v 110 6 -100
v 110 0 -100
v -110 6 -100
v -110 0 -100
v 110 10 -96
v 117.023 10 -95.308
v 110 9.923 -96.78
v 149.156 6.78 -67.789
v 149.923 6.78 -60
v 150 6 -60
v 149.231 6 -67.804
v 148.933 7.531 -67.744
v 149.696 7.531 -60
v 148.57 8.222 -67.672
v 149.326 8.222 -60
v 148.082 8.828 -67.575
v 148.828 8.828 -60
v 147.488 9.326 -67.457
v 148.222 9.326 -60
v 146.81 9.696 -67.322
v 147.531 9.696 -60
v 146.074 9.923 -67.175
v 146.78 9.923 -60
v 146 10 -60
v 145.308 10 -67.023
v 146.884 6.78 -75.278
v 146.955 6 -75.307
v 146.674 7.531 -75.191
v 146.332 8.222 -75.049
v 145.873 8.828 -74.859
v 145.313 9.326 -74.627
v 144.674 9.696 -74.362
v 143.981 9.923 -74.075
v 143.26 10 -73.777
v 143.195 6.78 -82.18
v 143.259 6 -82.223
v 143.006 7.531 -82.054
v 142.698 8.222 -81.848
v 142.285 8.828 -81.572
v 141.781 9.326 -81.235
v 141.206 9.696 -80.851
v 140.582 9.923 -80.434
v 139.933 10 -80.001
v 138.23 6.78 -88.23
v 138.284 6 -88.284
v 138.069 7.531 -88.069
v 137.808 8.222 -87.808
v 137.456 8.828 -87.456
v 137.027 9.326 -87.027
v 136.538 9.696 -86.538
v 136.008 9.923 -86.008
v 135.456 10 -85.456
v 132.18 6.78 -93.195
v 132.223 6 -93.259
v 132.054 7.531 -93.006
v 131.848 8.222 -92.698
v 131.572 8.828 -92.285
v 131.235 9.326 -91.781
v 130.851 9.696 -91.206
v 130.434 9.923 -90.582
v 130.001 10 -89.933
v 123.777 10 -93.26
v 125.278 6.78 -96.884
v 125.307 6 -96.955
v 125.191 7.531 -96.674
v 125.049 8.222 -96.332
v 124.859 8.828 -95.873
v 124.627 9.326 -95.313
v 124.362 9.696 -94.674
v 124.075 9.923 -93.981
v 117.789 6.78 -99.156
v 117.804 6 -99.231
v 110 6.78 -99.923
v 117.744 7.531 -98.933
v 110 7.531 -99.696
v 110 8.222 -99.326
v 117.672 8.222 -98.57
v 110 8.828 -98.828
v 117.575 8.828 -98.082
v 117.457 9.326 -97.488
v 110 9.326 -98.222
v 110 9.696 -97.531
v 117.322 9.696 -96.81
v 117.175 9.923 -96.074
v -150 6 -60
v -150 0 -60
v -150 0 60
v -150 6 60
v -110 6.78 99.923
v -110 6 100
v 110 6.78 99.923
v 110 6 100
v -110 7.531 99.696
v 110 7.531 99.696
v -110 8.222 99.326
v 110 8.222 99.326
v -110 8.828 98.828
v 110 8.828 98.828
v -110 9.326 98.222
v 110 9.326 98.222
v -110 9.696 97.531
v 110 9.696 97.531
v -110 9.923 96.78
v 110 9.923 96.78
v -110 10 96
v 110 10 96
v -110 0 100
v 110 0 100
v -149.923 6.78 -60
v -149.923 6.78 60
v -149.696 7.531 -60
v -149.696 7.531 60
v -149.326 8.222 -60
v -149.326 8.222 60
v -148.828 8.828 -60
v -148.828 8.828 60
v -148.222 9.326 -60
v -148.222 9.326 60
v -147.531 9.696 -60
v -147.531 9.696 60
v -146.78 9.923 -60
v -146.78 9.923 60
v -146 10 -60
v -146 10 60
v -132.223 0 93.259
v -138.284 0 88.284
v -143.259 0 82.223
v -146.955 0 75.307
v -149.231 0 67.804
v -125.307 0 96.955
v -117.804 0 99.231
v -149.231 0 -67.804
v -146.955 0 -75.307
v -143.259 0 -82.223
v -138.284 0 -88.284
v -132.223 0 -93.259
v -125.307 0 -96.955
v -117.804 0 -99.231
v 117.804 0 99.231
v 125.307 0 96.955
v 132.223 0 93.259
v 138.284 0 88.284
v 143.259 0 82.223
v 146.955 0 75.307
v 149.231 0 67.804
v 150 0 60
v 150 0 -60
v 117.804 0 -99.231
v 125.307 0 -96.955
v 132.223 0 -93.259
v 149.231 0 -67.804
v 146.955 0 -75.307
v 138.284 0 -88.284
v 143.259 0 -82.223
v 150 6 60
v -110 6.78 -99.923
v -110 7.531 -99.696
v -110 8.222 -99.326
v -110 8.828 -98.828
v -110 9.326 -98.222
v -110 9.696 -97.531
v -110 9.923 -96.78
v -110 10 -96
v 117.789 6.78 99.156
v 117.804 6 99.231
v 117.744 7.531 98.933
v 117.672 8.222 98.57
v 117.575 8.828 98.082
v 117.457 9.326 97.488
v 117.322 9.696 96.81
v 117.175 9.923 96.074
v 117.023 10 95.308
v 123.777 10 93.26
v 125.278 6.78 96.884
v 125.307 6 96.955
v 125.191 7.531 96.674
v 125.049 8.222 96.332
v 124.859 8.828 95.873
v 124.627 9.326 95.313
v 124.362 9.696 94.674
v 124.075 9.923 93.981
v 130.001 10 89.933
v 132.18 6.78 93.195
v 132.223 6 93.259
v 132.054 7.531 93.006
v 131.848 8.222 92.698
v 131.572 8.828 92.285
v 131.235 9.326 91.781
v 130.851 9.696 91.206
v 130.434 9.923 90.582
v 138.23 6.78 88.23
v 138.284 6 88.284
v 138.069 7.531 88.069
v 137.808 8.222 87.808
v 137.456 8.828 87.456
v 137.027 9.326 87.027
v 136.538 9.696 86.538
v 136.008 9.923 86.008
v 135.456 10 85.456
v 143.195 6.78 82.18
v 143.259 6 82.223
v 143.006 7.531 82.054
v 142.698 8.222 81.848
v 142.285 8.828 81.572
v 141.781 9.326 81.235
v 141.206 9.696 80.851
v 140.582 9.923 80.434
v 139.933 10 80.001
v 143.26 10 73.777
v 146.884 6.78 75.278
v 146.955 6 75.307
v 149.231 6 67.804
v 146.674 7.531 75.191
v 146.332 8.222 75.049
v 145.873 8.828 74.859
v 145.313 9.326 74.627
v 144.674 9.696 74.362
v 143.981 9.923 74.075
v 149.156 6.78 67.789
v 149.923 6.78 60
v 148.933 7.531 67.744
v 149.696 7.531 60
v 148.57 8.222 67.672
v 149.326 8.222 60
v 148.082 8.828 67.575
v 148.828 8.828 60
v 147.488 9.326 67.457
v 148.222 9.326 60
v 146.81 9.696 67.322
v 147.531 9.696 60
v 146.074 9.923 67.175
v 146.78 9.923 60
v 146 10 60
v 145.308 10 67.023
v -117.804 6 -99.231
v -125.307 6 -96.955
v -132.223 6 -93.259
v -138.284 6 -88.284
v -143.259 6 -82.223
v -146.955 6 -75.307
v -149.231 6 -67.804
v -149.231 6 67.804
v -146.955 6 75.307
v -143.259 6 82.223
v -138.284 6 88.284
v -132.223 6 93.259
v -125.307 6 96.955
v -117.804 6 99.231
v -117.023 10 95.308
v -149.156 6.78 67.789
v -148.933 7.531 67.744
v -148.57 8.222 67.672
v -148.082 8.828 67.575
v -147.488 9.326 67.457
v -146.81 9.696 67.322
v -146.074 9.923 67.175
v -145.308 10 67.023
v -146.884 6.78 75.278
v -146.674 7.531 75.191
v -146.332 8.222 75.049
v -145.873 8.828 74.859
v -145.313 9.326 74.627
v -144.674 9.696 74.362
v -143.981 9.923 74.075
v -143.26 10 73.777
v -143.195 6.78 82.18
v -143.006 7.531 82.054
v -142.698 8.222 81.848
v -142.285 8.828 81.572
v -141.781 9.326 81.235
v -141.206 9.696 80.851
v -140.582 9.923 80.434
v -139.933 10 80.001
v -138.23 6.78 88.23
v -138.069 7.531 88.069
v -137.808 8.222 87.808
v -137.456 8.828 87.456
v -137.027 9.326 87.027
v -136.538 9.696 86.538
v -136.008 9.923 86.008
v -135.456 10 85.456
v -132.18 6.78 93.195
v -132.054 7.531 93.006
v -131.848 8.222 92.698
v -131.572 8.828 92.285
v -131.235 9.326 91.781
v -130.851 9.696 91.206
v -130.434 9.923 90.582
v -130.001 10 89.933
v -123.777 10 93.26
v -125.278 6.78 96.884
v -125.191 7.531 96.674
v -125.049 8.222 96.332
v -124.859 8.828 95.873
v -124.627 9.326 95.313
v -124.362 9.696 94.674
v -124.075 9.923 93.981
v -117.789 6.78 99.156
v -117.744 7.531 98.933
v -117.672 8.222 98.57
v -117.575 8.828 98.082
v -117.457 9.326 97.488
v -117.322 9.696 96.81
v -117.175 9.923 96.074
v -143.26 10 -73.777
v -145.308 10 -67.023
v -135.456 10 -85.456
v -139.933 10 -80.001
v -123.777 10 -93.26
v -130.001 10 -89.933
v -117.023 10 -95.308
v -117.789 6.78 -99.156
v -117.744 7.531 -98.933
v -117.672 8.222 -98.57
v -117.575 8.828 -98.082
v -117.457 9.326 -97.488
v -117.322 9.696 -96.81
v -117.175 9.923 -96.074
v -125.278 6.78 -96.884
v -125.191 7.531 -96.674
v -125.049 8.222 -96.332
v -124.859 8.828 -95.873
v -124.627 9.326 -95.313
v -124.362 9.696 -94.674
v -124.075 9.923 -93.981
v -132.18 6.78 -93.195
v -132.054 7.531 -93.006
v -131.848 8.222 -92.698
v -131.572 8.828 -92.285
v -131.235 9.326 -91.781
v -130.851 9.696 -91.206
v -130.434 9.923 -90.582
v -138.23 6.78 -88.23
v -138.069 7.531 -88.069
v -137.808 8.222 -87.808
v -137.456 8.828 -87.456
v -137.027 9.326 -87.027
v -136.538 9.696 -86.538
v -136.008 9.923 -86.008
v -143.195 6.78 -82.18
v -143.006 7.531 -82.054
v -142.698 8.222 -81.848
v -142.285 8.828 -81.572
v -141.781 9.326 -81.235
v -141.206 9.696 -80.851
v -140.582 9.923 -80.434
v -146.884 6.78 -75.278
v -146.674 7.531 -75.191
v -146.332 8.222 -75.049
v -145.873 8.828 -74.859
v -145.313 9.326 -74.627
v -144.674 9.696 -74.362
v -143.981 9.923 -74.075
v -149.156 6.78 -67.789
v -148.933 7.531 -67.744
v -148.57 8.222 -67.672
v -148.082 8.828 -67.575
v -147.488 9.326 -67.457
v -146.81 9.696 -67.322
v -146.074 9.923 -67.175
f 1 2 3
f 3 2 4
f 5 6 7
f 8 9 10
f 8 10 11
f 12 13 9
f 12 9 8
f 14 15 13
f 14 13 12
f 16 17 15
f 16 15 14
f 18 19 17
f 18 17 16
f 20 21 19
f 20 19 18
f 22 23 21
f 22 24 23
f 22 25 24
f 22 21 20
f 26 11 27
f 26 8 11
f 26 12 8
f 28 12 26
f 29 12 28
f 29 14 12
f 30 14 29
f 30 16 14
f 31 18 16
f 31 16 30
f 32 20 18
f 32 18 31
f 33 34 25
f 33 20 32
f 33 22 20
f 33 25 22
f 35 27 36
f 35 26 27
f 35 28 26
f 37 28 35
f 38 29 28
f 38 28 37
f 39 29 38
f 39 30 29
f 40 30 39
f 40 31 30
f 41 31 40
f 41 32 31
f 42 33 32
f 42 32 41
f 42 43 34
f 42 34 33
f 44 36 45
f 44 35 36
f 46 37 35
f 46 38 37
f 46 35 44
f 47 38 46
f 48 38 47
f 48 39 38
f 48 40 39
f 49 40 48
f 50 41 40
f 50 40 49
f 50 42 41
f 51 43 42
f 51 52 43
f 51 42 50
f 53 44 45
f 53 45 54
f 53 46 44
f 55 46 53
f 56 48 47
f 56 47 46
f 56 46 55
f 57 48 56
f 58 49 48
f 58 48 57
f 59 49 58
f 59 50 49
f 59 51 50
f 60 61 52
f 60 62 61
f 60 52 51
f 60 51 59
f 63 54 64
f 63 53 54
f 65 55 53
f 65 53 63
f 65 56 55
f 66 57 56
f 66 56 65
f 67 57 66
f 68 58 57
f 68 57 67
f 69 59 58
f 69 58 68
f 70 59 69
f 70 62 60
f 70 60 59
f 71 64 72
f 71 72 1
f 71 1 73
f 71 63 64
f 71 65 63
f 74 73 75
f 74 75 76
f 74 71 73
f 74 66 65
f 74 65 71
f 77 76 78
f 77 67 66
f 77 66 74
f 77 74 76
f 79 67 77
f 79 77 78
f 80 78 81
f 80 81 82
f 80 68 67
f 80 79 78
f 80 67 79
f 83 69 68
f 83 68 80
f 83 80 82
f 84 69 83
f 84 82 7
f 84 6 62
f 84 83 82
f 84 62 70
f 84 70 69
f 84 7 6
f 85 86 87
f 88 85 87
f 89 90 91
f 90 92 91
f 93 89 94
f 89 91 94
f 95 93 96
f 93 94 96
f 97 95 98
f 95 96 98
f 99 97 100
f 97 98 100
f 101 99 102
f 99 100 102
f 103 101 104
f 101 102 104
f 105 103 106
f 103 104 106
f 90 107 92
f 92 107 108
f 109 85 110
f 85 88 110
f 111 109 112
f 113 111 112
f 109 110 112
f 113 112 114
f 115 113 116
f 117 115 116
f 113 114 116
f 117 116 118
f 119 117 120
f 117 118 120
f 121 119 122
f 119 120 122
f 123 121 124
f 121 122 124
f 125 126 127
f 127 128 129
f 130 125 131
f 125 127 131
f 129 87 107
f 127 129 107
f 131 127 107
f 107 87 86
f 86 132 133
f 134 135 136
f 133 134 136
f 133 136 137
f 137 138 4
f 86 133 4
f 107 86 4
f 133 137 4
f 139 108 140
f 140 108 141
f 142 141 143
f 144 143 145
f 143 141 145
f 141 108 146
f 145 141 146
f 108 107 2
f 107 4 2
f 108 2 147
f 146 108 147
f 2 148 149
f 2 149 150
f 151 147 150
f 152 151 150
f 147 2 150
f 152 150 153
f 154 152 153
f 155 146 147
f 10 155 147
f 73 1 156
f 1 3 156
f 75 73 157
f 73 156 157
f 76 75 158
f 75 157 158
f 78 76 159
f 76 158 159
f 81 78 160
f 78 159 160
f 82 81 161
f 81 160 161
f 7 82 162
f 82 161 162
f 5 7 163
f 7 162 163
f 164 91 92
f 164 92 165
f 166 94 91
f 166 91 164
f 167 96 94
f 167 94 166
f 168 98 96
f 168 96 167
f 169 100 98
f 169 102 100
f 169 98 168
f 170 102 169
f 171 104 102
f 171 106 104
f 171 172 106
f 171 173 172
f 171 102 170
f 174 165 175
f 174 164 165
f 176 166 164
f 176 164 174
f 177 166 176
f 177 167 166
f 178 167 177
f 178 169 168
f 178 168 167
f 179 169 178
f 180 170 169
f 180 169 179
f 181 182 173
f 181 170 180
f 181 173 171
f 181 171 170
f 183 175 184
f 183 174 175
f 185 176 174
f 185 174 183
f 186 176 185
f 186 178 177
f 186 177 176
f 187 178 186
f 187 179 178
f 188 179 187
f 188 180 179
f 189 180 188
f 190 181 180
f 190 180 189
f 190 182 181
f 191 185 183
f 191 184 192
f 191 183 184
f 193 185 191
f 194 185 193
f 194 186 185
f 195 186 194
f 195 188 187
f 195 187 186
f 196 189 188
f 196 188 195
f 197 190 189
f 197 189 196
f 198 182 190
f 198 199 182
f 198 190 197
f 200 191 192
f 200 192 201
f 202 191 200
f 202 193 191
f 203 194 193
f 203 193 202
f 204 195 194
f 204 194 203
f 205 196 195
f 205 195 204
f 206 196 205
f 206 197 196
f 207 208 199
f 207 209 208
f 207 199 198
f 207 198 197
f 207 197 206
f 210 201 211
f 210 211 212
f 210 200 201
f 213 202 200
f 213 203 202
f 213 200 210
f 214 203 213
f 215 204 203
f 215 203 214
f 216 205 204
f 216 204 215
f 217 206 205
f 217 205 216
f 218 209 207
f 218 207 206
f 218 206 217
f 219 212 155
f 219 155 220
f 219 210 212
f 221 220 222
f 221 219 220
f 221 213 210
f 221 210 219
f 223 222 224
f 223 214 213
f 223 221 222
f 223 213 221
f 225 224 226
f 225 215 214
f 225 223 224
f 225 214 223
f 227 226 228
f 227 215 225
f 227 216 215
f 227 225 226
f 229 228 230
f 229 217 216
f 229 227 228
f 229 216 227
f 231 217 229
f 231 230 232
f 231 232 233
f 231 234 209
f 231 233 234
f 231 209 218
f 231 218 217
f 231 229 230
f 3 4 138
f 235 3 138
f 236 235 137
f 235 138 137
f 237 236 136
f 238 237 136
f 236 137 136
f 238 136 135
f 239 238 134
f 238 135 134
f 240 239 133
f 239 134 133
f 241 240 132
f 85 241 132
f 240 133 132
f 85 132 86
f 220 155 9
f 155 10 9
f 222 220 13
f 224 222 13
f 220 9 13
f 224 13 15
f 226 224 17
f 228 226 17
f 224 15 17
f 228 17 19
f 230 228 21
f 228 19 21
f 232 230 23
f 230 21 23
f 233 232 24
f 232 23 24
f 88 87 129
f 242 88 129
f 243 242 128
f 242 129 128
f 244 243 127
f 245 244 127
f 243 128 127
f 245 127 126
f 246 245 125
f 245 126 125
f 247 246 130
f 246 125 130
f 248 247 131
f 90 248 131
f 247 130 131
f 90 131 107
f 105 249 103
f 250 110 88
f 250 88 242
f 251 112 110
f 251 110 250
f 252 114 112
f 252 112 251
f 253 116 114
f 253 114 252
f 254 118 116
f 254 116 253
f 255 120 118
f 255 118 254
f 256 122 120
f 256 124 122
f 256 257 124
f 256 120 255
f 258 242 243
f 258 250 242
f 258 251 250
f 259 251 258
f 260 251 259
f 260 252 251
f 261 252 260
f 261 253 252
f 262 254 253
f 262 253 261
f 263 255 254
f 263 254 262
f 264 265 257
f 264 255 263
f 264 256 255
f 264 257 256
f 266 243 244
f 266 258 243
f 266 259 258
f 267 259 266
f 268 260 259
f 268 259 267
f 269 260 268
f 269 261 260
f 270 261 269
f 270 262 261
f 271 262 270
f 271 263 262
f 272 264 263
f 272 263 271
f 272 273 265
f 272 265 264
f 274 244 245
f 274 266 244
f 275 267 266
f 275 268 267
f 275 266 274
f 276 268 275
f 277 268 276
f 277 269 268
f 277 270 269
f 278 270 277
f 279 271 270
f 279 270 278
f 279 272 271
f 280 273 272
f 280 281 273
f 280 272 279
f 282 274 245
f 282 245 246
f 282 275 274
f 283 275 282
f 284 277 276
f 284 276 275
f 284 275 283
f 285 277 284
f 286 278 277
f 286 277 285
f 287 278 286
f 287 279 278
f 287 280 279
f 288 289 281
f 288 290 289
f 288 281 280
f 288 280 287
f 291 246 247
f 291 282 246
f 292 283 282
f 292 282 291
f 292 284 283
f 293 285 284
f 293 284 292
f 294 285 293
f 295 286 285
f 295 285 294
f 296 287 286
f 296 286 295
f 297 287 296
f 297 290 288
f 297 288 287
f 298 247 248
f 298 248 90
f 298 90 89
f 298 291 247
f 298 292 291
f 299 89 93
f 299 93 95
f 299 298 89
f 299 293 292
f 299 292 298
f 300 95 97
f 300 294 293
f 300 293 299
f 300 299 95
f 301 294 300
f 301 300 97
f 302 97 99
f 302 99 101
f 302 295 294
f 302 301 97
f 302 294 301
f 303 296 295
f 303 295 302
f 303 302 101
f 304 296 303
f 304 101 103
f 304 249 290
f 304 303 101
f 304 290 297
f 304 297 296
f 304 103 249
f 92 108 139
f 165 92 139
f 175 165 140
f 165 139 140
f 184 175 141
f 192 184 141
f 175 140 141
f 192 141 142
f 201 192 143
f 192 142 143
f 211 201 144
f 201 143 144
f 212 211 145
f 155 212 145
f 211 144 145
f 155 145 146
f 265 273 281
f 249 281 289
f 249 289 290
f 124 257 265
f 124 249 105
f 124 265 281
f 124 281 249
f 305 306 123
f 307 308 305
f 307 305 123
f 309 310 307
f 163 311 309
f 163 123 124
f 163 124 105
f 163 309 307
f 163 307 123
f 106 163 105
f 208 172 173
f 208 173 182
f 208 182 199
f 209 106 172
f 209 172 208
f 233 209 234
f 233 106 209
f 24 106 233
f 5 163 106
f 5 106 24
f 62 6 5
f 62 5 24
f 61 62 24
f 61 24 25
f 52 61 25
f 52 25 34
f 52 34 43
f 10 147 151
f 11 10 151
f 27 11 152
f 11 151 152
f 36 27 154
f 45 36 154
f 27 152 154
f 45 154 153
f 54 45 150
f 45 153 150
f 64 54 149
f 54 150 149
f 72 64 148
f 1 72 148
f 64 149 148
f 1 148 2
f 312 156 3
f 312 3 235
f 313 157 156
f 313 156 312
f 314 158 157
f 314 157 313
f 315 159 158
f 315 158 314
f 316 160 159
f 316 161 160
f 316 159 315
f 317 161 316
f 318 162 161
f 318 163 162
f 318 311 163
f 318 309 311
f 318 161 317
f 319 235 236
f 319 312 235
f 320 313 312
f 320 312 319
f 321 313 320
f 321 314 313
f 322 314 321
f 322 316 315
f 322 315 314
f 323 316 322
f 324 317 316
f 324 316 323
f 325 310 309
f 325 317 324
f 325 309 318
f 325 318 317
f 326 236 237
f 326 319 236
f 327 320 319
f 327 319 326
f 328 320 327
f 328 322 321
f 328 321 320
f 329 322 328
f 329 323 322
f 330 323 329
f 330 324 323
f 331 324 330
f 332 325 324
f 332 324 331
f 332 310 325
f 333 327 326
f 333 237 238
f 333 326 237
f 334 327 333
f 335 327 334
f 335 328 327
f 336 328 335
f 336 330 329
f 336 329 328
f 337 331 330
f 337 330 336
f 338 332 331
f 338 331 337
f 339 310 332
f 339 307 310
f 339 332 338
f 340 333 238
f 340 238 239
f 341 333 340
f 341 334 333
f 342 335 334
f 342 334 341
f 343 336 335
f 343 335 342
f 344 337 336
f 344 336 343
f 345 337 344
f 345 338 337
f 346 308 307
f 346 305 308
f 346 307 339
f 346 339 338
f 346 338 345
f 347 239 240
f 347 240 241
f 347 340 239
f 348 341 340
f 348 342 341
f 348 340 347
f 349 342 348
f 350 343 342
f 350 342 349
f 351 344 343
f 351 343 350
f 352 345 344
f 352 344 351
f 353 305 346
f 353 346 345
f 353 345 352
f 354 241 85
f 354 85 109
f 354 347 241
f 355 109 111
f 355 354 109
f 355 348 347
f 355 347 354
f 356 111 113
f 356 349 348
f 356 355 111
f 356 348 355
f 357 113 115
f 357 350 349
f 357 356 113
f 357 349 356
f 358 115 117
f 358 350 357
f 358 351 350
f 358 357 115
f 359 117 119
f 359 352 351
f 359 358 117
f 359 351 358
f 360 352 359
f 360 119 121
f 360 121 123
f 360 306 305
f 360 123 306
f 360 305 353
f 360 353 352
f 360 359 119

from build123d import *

# Parameters (mm, degrees)
DODANIE_WYCI_GNI_CIE1_DEPTH = 10
ZAOKR_GLENIE1_R             = 4


with BuildPart() as part:
    # Szkic1 → Dodanie-wyciągnięcie1 (new body)
    with BuildSketch(Plane(origin=(0, 0, 0), x_dir=(1, 0, 0), z_dir=(0, 1, 0))):
        with BuildLine():
            Line((-110, -100), (110, -100))
            ThreePointArc((110, -100), (138.284271247, -88.284271247), (150, -60))
            Line((150, -60), (150, 60))
            ThreePointArc((150, 60), (138.284271247, 88.284271247), (110, 100))
            Line((110, 100), (-110, 100))
            ThreePointArc((-110, 100), (-138.284271247, 88.284271247), (-150, 60))
            Line((-150, 60), (-150, -60))
            ThreePointArc((-150, -60), (-138.284271247, -88.284271247), (-110, -100))
        make_face()
    extrude(amount=DODANIE_WYCI_GNI_CIE1_DEPTH)

    # Zaokrąglenie1
    zaokr_glenie1_edges = [part.edges().sort_by_distance(p)[0] for p in [
        (-138.284271247, 10, -88.284271247),
        (-150, 10, 0),
        (-138.284271247, 10, 88.284271247),
        (0, 10, 100),
        (138.284271247, 10, 88.284271247),
        (150, 10, 0),
        (138.284271247, 10, -88.284271247),
        (0, 10, -100),
    ]]
    fillet(zaokr_glenie1_edges, radius=ZAOKR_GLENIE1_R)


solid = part.part
